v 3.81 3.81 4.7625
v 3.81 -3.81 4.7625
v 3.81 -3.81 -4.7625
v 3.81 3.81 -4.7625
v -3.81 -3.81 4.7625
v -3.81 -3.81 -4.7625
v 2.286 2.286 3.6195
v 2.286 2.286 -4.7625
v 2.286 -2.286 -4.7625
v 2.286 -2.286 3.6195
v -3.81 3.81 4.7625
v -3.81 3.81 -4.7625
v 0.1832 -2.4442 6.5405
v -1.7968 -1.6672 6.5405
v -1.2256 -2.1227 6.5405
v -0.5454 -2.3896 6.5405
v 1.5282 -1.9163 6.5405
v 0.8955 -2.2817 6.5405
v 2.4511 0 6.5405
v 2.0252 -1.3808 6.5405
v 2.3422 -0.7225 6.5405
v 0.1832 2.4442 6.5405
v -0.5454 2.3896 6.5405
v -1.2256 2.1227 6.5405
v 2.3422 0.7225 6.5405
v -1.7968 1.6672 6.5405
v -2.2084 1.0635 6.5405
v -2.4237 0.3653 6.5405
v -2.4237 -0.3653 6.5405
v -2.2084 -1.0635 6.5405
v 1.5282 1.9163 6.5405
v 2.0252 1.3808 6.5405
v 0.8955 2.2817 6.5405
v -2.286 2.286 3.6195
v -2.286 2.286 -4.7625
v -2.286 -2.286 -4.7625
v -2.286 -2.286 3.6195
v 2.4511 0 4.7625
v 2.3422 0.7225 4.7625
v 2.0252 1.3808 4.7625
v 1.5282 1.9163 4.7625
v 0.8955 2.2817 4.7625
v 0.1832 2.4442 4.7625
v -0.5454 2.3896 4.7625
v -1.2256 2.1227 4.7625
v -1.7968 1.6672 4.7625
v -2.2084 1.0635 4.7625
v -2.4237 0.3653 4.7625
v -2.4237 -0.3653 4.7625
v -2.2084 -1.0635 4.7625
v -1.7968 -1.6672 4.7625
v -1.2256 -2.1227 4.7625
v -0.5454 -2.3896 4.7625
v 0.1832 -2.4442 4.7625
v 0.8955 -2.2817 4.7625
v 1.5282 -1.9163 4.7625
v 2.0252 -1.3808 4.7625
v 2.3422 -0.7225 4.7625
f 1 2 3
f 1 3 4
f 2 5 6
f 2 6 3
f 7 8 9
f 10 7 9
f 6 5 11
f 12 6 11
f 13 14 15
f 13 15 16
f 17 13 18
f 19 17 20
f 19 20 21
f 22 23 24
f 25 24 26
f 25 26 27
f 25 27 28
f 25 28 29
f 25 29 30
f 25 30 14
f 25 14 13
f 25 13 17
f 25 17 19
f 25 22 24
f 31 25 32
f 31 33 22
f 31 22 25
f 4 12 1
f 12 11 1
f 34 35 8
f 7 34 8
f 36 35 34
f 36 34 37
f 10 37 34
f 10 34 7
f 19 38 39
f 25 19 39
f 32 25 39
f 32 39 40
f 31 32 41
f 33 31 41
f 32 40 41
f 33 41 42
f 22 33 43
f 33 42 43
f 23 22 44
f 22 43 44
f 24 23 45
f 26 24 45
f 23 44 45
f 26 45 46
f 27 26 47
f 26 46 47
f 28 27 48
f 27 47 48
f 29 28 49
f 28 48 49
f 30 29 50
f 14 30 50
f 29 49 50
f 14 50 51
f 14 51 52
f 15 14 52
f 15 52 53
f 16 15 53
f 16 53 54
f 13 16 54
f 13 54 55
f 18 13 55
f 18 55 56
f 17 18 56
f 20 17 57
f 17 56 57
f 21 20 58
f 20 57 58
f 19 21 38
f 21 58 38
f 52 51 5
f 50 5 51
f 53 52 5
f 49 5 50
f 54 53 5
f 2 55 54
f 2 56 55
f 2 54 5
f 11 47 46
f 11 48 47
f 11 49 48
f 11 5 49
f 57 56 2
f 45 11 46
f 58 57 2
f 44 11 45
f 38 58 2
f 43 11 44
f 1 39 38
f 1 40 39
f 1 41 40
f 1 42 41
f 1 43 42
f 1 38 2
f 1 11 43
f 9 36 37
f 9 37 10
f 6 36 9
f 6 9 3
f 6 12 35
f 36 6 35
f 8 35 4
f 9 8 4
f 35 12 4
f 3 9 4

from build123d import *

# Parameters (mm, degrees)
F0_W     = 7.62
F0_H     = 7.620002
F1_DEPTH = 4.7625
F2_R     = 2.4511
F3_DEPTH = 1.778
F4_W     = 4.572
F4_H     = 4.572002
F5_DEPTH = 8.382


with BuildPart() as f1:
    # F0 (on Top) → F1 (new body, symmetric)
    with BuildSketch(Plane.XY):
        Rectangle(F0_W, F0_H)
    extrude(amount=F1_DEPTH, both=True)

    # F2 (on face) → F3 (join)
    with BuildSketch(Plane.XY.offset(4.7625)):
        Circle(F2_R)
    extrude(amount=F3_DEPTH)

    # F4 (on face) → F5 (cut)
    with BuildSketch(Plane(origin=(0, 0, -4.7625), x_dir=(1, 0, 0), z_dir=(0, 0, -1))):
        Rectangle(F4_W, F4_H)
    extrude(amount=-F5_DEPTH, mode=Mode.SUBTRACT)


solid = f1.part
